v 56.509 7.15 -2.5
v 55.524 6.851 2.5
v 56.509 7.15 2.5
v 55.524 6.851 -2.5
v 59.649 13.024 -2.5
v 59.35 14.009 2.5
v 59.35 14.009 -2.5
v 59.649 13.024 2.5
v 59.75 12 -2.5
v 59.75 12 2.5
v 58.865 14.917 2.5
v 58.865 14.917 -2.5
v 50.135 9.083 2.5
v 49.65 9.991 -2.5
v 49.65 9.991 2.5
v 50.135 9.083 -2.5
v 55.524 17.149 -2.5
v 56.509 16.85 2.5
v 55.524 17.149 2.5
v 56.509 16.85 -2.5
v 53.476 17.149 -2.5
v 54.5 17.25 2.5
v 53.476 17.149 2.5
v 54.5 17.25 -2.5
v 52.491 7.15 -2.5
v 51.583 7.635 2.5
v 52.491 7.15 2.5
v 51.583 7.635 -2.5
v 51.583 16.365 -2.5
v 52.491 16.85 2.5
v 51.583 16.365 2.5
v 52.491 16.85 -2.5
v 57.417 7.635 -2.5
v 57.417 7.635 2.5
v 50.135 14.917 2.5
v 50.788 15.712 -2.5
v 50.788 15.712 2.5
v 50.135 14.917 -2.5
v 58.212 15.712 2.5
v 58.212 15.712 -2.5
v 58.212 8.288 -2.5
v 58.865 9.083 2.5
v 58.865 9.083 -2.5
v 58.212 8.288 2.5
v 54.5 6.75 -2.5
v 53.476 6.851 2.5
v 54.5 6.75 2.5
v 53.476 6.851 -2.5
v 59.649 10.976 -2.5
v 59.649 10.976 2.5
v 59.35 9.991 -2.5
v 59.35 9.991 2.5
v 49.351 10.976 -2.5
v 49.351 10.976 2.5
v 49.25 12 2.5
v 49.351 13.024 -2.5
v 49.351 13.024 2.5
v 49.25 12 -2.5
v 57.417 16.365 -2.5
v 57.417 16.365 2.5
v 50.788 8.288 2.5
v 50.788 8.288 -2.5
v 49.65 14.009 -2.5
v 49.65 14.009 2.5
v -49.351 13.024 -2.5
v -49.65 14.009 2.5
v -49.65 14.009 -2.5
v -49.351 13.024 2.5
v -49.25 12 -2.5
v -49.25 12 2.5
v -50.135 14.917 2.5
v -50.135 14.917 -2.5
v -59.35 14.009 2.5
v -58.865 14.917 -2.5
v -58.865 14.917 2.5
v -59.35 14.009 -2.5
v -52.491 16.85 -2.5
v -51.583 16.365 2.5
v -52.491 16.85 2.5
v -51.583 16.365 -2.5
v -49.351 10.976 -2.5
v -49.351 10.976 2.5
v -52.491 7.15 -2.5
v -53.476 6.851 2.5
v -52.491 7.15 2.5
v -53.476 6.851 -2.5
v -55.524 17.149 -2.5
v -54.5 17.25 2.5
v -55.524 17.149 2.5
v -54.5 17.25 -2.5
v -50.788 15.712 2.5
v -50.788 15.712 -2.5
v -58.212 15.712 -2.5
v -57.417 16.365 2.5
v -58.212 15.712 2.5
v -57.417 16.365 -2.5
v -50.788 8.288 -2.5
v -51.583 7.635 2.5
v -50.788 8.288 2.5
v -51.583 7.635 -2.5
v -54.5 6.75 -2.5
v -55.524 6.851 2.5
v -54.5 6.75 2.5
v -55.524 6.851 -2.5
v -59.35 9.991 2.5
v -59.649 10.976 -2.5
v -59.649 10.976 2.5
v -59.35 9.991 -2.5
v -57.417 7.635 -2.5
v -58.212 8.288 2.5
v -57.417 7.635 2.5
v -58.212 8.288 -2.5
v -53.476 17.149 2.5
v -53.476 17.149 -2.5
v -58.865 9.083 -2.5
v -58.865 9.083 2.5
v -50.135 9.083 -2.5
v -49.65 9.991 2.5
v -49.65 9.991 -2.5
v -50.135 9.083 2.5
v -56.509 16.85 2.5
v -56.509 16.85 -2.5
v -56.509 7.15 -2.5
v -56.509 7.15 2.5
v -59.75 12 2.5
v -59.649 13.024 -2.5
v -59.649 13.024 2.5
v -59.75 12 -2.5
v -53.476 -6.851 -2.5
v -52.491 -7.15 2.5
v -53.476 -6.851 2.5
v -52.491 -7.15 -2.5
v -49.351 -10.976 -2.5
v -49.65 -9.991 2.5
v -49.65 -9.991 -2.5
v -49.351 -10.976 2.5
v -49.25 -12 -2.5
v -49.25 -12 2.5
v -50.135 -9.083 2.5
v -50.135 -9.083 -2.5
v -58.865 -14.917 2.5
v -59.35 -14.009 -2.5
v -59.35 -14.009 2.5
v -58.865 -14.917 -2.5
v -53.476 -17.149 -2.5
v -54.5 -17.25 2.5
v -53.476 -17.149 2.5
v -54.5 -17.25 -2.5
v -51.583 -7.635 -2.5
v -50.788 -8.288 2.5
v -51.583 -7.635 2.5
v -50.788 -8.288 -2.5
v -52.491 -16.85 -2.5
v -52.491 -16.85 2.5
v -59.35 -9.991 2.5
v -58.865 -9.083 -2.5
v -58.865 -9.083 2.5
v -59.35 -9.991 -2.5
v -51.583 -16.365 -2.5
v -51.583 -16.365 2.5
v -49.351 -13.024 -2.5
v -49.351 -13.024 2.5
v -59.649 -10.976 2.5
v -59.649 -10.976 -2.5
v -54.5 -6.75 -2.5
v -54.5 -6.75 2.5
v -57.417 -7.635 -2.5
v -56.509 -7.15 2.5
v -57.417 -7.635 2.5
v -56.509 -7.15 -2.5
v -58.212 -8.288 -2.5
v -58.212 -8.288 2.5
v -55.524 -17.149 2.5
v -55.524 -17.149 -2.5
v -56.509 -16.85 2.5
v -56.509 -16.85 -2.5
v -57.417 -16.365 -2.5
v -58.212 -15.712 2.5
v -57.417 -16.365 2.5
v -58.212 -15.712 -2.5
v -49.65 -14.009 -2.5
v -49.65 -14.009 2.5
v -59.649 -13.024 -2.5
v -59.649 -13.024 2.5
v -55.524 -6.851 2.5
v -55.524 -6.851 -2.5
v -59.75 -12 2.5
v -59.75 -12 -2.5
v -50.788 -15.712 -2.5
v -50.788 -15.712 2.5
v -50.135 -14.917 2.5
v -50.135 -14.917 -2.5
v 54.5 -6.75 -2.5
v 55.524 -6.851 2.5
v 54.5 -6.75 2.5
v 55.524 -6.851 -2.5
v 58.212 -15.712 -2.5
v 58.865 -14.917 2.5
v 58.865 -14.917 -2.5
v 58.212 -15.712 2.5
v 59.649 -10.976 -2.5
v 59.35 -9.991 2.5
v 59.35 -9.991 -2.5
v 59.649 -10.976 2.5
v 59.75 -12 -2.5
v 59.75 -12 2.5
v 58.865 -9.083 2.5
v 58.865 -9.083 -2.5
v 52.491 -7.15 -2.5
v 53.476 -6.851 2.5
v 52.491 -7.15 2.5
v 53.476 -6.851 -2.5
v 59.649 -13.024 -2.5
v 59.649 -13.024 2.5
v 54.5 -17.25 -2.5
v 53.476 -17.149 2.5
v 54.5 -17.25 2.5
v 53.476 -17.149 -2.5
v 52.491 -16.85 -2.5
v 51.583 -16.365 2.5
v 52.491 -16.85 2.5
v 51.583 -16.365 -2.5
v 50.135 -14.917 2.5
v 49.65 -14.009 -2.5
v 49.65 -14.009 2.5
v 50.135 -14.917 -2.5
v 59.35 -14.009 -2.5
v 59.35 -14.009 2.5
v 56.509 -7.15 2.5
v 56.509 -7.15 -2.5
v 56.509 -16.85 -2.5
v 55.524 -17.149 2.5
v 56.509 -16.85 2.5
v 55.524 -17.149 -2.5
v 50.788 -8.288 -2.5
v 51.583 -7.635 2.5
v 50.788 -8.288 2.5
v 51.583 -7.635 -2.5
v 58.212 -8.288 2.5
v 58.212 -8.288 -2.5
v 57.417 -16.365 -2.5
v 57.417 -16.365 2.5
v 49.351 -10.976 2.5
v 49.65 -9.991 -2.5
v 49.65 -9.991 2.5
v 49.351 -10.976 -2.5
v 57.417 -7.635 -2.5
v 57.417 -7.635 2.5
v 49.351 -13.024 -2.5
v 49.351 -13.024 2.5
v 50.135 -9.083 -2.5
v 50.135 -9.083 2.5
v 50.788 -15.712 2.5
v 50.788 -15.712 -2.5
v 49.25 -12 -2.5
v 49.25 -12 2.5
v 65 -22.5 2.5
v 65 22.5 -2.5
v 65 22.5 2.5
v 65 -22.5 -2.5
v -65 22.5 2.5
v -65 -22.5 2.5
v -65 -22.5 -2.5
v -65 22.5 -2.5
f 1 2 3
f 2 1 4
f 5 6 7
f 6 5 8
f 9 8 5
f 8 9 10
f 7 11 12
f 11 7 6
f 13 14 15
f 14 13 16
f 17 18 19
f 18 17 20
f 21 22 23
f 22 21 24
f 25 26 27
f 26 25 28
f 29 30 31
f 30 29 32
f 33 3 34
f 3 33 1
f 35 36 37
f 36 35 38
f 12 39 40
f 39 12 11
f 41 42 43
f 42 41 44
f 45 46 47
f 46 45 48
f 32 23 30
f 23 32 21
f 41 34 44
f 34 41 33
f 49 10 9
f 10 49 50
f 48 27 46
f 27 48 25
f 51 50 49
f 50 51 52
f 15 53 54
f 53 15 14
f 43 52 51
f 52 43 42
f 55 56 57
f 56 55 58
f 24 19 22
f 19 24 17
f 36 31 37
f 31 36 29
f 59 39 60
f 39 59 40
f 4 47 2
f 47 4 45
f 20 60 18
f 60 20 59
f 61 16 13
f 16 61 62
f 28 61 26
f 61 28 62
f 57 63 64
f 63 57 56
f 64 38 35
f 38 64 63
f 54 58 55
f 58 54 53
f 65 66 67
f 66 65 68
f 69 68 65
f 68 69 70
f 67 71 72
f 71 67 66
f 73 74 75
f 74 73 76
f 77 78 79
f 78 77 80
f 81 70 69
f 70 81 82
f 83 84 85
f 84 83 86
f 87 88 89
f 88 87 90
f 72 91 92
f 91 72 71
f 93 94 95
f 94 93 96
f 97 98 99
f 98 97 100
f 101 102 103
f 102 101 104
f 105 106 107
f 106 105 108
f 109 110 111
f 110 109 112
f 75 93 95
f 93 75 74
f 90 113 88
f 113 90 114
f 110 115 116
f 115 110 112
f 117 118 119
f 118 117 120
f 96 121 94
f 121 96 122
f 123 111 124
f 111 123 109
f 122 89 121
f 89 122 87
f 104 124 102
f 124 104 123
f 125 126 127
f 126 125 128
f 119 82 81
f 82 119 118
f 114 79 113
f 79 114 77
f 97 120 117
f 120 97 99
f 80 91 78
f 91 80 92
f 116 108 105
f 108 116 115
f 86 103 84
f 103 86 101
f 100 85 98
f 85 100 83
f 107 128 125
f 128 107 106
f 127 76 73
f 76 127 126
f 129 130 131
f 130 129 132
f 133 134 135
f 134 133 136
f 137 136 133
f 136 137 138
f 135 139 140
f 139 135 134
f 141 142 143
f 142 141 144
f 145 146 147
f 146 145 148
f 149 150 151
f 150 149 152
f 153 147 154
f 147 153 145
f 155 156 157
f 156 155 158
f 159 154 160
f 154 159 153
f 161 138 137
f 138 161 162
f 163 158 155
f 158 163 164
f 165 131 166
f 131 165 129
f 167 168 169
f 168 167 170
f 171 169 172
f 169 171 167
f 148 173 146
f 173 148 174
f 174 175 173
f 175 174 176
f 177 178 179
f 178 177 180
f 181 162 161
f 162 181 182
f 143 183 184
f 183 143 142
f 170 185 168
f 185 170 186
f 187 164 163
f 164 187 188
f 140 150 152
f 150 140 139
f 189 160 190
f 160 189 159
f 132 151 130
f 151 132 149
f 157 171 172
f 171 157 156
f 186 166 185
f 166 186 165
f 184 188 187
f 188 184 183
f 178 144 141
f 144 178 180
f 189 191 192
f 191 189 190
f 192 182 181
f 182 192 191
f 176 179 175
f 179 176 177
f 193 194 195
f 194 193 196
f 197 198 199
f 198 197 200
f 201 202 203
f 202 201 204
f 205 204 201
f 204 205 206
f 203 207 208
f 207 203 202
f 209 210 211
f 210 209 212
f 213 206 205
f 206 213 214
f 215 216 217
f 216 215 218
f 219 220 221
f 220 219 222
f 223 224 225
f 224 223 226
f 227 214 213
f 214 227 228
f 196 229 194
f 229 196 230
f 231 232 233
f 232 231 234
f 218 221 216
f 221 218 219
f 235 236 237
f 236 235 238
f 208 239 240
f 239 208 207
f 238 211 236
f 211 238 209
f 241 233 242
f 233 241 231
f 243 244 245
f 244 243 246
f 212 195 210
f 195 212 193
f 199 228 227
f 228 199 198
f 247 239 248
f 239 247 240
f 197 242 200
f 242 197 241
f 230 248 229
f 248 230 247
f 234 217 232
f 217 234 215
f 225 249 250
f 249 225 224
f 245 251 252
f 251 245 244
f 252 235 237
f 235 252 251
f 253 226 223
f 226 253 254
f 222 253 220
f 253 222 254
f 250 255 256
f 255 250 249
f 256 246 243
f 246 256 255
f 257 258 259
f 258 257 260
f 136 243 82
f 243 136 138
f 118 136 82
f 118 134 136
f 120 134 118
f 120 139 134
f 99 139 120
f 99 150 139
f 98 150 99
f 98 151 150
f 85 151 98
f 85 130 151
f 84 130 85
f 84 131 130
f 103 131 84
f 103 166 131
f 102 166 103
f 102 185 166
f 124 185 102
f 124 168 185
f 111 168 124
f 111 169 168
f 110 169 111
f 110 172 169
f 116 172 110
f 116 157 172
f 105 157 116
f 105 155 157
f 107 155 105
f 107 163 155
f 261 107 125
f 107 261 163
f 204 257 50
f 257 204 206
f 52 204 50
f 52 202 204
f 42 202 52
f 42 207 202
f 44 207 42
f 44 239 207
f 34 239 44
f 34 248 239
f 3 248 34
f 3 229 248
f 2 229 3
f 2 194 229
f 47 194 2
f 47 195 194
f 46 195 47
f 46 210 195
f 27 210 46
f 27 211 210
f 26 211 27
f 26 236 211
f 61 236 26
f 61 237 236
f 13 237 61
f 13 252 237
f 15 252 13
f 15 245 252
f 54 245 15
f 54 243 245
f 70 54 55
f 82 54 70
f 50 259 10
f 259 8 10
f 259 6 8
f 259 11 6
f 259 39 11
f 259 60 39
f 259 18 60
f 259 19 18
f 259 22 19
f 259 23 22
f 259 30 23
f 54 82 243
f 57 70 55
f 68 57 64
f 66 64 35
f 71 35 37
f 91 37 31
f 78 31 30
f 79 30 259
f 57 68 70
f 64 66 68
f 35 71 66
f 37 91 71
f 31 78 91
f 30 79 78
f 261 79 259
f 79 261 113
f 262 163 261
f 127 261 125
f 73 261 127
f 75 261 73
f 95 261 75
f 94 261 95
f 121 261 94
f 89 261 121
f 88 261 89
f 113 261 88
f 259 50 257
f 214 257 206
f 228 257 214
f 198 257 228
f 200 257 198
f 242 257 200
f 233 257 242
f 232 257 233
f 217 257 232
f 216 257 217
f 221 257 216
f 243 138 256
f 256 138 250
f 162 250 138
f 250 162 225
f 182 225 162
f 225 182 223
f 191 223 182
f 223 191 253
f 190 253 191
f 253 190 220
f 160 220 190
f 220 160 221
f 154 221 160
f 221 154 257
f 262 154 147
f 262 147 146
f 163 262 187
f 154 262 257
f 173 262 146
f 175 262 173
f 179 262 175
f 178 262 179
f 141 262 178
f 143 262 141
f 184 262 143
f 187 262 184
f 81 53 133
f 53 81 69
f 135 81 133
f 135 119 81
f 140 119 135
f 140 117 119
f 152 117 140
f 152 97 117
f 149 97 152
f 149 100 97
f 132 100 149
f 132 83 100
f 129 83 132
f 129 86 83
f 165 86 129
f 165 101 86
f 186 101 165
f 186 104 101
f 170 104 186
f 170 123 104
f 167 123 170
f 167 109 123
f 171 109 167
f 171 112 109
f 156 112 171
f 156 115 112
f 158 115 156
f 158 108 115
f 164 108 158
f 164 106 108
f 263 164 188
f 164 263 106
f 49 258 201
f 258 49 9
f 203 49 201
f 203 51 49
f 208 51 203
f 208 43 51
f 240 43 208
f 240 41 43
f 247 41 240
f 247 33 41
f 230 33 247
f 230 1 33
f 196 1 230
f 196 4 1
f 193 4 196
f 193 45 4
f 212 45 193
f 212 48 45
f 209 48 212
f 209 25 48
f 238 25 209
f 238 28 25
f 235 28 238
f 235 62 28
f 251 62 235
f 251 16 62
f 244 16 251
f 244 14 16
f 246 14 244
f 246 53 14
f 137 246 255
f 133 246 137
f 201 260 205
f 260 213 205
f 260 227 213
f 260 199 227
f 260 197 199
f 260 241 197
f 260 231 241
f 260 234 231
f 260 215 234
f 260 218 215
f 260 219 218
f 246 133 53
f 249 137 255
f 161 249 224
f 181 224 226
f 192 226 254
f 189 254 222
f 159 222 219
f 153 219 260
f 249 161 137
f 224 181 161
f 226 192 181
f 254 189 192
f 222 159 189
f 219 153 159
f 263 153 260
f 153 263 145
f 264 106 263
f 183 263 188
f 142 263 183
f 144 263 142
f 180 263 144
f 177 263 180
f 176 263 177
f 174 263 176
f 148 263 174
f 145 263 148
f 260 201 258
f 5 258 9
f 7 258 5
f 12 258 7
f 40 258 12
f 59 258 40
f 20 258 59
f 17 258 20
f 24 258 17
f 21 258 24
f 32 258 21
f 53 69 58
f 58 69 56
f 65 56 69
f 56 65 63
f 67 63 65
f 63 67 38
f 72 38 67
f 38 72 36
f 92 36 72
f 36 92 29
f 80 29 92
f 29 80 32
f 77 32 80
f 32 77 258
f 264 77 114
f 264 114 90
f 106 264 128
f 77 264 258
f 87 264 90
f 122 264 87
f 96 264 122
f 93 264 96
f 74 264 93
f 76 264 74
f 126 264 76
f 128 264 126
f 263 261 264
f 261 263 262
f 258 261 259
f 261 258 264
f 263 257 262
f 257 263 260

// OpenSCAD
$fn = 32;

// ----------------------------------------------------------------------
// Corner plate 130 x 45 x 5
// 4 holes, centres taken from the edge offset
// ----------------------------------------------------------------------

// --- parameters (mm) ---
plate = [130, 45, 5];  // overall size (x, y, z)
seat_tol = 0.15;       // tolerance at the seating features
free_tol = 0.5;        // general tolerance on the free sizes
holes = 4;             // number of holes the drawing asks for
hole_d = 10.5;         // hole diameter
edge = 10.5;           // hole centre offset from the plate edge

// --- derived feature positions (mm) ---
corner_x = plate[0] / 2 - edge;  // = 54.5   corner hole X
corner_y = plate[1] / 2 - edge;  // = 12   corner hole Y
feature_centers = [
  [corner_x, corner_y],
  [-corner_x, corner_y],
  [-corner_x, -corner_y],
  [corner_x, -corner_y]
];   // hole centres the loop below drills

// plate outline, every hole drilled through with the same cutters
difference() {
  cube(plate, center = true);
  for (centre = feature_centers)
    translate([centre[0], centre[1], 0])
      cylinder(d = hole_d, h = plate[2] + 2, center = true);
}
